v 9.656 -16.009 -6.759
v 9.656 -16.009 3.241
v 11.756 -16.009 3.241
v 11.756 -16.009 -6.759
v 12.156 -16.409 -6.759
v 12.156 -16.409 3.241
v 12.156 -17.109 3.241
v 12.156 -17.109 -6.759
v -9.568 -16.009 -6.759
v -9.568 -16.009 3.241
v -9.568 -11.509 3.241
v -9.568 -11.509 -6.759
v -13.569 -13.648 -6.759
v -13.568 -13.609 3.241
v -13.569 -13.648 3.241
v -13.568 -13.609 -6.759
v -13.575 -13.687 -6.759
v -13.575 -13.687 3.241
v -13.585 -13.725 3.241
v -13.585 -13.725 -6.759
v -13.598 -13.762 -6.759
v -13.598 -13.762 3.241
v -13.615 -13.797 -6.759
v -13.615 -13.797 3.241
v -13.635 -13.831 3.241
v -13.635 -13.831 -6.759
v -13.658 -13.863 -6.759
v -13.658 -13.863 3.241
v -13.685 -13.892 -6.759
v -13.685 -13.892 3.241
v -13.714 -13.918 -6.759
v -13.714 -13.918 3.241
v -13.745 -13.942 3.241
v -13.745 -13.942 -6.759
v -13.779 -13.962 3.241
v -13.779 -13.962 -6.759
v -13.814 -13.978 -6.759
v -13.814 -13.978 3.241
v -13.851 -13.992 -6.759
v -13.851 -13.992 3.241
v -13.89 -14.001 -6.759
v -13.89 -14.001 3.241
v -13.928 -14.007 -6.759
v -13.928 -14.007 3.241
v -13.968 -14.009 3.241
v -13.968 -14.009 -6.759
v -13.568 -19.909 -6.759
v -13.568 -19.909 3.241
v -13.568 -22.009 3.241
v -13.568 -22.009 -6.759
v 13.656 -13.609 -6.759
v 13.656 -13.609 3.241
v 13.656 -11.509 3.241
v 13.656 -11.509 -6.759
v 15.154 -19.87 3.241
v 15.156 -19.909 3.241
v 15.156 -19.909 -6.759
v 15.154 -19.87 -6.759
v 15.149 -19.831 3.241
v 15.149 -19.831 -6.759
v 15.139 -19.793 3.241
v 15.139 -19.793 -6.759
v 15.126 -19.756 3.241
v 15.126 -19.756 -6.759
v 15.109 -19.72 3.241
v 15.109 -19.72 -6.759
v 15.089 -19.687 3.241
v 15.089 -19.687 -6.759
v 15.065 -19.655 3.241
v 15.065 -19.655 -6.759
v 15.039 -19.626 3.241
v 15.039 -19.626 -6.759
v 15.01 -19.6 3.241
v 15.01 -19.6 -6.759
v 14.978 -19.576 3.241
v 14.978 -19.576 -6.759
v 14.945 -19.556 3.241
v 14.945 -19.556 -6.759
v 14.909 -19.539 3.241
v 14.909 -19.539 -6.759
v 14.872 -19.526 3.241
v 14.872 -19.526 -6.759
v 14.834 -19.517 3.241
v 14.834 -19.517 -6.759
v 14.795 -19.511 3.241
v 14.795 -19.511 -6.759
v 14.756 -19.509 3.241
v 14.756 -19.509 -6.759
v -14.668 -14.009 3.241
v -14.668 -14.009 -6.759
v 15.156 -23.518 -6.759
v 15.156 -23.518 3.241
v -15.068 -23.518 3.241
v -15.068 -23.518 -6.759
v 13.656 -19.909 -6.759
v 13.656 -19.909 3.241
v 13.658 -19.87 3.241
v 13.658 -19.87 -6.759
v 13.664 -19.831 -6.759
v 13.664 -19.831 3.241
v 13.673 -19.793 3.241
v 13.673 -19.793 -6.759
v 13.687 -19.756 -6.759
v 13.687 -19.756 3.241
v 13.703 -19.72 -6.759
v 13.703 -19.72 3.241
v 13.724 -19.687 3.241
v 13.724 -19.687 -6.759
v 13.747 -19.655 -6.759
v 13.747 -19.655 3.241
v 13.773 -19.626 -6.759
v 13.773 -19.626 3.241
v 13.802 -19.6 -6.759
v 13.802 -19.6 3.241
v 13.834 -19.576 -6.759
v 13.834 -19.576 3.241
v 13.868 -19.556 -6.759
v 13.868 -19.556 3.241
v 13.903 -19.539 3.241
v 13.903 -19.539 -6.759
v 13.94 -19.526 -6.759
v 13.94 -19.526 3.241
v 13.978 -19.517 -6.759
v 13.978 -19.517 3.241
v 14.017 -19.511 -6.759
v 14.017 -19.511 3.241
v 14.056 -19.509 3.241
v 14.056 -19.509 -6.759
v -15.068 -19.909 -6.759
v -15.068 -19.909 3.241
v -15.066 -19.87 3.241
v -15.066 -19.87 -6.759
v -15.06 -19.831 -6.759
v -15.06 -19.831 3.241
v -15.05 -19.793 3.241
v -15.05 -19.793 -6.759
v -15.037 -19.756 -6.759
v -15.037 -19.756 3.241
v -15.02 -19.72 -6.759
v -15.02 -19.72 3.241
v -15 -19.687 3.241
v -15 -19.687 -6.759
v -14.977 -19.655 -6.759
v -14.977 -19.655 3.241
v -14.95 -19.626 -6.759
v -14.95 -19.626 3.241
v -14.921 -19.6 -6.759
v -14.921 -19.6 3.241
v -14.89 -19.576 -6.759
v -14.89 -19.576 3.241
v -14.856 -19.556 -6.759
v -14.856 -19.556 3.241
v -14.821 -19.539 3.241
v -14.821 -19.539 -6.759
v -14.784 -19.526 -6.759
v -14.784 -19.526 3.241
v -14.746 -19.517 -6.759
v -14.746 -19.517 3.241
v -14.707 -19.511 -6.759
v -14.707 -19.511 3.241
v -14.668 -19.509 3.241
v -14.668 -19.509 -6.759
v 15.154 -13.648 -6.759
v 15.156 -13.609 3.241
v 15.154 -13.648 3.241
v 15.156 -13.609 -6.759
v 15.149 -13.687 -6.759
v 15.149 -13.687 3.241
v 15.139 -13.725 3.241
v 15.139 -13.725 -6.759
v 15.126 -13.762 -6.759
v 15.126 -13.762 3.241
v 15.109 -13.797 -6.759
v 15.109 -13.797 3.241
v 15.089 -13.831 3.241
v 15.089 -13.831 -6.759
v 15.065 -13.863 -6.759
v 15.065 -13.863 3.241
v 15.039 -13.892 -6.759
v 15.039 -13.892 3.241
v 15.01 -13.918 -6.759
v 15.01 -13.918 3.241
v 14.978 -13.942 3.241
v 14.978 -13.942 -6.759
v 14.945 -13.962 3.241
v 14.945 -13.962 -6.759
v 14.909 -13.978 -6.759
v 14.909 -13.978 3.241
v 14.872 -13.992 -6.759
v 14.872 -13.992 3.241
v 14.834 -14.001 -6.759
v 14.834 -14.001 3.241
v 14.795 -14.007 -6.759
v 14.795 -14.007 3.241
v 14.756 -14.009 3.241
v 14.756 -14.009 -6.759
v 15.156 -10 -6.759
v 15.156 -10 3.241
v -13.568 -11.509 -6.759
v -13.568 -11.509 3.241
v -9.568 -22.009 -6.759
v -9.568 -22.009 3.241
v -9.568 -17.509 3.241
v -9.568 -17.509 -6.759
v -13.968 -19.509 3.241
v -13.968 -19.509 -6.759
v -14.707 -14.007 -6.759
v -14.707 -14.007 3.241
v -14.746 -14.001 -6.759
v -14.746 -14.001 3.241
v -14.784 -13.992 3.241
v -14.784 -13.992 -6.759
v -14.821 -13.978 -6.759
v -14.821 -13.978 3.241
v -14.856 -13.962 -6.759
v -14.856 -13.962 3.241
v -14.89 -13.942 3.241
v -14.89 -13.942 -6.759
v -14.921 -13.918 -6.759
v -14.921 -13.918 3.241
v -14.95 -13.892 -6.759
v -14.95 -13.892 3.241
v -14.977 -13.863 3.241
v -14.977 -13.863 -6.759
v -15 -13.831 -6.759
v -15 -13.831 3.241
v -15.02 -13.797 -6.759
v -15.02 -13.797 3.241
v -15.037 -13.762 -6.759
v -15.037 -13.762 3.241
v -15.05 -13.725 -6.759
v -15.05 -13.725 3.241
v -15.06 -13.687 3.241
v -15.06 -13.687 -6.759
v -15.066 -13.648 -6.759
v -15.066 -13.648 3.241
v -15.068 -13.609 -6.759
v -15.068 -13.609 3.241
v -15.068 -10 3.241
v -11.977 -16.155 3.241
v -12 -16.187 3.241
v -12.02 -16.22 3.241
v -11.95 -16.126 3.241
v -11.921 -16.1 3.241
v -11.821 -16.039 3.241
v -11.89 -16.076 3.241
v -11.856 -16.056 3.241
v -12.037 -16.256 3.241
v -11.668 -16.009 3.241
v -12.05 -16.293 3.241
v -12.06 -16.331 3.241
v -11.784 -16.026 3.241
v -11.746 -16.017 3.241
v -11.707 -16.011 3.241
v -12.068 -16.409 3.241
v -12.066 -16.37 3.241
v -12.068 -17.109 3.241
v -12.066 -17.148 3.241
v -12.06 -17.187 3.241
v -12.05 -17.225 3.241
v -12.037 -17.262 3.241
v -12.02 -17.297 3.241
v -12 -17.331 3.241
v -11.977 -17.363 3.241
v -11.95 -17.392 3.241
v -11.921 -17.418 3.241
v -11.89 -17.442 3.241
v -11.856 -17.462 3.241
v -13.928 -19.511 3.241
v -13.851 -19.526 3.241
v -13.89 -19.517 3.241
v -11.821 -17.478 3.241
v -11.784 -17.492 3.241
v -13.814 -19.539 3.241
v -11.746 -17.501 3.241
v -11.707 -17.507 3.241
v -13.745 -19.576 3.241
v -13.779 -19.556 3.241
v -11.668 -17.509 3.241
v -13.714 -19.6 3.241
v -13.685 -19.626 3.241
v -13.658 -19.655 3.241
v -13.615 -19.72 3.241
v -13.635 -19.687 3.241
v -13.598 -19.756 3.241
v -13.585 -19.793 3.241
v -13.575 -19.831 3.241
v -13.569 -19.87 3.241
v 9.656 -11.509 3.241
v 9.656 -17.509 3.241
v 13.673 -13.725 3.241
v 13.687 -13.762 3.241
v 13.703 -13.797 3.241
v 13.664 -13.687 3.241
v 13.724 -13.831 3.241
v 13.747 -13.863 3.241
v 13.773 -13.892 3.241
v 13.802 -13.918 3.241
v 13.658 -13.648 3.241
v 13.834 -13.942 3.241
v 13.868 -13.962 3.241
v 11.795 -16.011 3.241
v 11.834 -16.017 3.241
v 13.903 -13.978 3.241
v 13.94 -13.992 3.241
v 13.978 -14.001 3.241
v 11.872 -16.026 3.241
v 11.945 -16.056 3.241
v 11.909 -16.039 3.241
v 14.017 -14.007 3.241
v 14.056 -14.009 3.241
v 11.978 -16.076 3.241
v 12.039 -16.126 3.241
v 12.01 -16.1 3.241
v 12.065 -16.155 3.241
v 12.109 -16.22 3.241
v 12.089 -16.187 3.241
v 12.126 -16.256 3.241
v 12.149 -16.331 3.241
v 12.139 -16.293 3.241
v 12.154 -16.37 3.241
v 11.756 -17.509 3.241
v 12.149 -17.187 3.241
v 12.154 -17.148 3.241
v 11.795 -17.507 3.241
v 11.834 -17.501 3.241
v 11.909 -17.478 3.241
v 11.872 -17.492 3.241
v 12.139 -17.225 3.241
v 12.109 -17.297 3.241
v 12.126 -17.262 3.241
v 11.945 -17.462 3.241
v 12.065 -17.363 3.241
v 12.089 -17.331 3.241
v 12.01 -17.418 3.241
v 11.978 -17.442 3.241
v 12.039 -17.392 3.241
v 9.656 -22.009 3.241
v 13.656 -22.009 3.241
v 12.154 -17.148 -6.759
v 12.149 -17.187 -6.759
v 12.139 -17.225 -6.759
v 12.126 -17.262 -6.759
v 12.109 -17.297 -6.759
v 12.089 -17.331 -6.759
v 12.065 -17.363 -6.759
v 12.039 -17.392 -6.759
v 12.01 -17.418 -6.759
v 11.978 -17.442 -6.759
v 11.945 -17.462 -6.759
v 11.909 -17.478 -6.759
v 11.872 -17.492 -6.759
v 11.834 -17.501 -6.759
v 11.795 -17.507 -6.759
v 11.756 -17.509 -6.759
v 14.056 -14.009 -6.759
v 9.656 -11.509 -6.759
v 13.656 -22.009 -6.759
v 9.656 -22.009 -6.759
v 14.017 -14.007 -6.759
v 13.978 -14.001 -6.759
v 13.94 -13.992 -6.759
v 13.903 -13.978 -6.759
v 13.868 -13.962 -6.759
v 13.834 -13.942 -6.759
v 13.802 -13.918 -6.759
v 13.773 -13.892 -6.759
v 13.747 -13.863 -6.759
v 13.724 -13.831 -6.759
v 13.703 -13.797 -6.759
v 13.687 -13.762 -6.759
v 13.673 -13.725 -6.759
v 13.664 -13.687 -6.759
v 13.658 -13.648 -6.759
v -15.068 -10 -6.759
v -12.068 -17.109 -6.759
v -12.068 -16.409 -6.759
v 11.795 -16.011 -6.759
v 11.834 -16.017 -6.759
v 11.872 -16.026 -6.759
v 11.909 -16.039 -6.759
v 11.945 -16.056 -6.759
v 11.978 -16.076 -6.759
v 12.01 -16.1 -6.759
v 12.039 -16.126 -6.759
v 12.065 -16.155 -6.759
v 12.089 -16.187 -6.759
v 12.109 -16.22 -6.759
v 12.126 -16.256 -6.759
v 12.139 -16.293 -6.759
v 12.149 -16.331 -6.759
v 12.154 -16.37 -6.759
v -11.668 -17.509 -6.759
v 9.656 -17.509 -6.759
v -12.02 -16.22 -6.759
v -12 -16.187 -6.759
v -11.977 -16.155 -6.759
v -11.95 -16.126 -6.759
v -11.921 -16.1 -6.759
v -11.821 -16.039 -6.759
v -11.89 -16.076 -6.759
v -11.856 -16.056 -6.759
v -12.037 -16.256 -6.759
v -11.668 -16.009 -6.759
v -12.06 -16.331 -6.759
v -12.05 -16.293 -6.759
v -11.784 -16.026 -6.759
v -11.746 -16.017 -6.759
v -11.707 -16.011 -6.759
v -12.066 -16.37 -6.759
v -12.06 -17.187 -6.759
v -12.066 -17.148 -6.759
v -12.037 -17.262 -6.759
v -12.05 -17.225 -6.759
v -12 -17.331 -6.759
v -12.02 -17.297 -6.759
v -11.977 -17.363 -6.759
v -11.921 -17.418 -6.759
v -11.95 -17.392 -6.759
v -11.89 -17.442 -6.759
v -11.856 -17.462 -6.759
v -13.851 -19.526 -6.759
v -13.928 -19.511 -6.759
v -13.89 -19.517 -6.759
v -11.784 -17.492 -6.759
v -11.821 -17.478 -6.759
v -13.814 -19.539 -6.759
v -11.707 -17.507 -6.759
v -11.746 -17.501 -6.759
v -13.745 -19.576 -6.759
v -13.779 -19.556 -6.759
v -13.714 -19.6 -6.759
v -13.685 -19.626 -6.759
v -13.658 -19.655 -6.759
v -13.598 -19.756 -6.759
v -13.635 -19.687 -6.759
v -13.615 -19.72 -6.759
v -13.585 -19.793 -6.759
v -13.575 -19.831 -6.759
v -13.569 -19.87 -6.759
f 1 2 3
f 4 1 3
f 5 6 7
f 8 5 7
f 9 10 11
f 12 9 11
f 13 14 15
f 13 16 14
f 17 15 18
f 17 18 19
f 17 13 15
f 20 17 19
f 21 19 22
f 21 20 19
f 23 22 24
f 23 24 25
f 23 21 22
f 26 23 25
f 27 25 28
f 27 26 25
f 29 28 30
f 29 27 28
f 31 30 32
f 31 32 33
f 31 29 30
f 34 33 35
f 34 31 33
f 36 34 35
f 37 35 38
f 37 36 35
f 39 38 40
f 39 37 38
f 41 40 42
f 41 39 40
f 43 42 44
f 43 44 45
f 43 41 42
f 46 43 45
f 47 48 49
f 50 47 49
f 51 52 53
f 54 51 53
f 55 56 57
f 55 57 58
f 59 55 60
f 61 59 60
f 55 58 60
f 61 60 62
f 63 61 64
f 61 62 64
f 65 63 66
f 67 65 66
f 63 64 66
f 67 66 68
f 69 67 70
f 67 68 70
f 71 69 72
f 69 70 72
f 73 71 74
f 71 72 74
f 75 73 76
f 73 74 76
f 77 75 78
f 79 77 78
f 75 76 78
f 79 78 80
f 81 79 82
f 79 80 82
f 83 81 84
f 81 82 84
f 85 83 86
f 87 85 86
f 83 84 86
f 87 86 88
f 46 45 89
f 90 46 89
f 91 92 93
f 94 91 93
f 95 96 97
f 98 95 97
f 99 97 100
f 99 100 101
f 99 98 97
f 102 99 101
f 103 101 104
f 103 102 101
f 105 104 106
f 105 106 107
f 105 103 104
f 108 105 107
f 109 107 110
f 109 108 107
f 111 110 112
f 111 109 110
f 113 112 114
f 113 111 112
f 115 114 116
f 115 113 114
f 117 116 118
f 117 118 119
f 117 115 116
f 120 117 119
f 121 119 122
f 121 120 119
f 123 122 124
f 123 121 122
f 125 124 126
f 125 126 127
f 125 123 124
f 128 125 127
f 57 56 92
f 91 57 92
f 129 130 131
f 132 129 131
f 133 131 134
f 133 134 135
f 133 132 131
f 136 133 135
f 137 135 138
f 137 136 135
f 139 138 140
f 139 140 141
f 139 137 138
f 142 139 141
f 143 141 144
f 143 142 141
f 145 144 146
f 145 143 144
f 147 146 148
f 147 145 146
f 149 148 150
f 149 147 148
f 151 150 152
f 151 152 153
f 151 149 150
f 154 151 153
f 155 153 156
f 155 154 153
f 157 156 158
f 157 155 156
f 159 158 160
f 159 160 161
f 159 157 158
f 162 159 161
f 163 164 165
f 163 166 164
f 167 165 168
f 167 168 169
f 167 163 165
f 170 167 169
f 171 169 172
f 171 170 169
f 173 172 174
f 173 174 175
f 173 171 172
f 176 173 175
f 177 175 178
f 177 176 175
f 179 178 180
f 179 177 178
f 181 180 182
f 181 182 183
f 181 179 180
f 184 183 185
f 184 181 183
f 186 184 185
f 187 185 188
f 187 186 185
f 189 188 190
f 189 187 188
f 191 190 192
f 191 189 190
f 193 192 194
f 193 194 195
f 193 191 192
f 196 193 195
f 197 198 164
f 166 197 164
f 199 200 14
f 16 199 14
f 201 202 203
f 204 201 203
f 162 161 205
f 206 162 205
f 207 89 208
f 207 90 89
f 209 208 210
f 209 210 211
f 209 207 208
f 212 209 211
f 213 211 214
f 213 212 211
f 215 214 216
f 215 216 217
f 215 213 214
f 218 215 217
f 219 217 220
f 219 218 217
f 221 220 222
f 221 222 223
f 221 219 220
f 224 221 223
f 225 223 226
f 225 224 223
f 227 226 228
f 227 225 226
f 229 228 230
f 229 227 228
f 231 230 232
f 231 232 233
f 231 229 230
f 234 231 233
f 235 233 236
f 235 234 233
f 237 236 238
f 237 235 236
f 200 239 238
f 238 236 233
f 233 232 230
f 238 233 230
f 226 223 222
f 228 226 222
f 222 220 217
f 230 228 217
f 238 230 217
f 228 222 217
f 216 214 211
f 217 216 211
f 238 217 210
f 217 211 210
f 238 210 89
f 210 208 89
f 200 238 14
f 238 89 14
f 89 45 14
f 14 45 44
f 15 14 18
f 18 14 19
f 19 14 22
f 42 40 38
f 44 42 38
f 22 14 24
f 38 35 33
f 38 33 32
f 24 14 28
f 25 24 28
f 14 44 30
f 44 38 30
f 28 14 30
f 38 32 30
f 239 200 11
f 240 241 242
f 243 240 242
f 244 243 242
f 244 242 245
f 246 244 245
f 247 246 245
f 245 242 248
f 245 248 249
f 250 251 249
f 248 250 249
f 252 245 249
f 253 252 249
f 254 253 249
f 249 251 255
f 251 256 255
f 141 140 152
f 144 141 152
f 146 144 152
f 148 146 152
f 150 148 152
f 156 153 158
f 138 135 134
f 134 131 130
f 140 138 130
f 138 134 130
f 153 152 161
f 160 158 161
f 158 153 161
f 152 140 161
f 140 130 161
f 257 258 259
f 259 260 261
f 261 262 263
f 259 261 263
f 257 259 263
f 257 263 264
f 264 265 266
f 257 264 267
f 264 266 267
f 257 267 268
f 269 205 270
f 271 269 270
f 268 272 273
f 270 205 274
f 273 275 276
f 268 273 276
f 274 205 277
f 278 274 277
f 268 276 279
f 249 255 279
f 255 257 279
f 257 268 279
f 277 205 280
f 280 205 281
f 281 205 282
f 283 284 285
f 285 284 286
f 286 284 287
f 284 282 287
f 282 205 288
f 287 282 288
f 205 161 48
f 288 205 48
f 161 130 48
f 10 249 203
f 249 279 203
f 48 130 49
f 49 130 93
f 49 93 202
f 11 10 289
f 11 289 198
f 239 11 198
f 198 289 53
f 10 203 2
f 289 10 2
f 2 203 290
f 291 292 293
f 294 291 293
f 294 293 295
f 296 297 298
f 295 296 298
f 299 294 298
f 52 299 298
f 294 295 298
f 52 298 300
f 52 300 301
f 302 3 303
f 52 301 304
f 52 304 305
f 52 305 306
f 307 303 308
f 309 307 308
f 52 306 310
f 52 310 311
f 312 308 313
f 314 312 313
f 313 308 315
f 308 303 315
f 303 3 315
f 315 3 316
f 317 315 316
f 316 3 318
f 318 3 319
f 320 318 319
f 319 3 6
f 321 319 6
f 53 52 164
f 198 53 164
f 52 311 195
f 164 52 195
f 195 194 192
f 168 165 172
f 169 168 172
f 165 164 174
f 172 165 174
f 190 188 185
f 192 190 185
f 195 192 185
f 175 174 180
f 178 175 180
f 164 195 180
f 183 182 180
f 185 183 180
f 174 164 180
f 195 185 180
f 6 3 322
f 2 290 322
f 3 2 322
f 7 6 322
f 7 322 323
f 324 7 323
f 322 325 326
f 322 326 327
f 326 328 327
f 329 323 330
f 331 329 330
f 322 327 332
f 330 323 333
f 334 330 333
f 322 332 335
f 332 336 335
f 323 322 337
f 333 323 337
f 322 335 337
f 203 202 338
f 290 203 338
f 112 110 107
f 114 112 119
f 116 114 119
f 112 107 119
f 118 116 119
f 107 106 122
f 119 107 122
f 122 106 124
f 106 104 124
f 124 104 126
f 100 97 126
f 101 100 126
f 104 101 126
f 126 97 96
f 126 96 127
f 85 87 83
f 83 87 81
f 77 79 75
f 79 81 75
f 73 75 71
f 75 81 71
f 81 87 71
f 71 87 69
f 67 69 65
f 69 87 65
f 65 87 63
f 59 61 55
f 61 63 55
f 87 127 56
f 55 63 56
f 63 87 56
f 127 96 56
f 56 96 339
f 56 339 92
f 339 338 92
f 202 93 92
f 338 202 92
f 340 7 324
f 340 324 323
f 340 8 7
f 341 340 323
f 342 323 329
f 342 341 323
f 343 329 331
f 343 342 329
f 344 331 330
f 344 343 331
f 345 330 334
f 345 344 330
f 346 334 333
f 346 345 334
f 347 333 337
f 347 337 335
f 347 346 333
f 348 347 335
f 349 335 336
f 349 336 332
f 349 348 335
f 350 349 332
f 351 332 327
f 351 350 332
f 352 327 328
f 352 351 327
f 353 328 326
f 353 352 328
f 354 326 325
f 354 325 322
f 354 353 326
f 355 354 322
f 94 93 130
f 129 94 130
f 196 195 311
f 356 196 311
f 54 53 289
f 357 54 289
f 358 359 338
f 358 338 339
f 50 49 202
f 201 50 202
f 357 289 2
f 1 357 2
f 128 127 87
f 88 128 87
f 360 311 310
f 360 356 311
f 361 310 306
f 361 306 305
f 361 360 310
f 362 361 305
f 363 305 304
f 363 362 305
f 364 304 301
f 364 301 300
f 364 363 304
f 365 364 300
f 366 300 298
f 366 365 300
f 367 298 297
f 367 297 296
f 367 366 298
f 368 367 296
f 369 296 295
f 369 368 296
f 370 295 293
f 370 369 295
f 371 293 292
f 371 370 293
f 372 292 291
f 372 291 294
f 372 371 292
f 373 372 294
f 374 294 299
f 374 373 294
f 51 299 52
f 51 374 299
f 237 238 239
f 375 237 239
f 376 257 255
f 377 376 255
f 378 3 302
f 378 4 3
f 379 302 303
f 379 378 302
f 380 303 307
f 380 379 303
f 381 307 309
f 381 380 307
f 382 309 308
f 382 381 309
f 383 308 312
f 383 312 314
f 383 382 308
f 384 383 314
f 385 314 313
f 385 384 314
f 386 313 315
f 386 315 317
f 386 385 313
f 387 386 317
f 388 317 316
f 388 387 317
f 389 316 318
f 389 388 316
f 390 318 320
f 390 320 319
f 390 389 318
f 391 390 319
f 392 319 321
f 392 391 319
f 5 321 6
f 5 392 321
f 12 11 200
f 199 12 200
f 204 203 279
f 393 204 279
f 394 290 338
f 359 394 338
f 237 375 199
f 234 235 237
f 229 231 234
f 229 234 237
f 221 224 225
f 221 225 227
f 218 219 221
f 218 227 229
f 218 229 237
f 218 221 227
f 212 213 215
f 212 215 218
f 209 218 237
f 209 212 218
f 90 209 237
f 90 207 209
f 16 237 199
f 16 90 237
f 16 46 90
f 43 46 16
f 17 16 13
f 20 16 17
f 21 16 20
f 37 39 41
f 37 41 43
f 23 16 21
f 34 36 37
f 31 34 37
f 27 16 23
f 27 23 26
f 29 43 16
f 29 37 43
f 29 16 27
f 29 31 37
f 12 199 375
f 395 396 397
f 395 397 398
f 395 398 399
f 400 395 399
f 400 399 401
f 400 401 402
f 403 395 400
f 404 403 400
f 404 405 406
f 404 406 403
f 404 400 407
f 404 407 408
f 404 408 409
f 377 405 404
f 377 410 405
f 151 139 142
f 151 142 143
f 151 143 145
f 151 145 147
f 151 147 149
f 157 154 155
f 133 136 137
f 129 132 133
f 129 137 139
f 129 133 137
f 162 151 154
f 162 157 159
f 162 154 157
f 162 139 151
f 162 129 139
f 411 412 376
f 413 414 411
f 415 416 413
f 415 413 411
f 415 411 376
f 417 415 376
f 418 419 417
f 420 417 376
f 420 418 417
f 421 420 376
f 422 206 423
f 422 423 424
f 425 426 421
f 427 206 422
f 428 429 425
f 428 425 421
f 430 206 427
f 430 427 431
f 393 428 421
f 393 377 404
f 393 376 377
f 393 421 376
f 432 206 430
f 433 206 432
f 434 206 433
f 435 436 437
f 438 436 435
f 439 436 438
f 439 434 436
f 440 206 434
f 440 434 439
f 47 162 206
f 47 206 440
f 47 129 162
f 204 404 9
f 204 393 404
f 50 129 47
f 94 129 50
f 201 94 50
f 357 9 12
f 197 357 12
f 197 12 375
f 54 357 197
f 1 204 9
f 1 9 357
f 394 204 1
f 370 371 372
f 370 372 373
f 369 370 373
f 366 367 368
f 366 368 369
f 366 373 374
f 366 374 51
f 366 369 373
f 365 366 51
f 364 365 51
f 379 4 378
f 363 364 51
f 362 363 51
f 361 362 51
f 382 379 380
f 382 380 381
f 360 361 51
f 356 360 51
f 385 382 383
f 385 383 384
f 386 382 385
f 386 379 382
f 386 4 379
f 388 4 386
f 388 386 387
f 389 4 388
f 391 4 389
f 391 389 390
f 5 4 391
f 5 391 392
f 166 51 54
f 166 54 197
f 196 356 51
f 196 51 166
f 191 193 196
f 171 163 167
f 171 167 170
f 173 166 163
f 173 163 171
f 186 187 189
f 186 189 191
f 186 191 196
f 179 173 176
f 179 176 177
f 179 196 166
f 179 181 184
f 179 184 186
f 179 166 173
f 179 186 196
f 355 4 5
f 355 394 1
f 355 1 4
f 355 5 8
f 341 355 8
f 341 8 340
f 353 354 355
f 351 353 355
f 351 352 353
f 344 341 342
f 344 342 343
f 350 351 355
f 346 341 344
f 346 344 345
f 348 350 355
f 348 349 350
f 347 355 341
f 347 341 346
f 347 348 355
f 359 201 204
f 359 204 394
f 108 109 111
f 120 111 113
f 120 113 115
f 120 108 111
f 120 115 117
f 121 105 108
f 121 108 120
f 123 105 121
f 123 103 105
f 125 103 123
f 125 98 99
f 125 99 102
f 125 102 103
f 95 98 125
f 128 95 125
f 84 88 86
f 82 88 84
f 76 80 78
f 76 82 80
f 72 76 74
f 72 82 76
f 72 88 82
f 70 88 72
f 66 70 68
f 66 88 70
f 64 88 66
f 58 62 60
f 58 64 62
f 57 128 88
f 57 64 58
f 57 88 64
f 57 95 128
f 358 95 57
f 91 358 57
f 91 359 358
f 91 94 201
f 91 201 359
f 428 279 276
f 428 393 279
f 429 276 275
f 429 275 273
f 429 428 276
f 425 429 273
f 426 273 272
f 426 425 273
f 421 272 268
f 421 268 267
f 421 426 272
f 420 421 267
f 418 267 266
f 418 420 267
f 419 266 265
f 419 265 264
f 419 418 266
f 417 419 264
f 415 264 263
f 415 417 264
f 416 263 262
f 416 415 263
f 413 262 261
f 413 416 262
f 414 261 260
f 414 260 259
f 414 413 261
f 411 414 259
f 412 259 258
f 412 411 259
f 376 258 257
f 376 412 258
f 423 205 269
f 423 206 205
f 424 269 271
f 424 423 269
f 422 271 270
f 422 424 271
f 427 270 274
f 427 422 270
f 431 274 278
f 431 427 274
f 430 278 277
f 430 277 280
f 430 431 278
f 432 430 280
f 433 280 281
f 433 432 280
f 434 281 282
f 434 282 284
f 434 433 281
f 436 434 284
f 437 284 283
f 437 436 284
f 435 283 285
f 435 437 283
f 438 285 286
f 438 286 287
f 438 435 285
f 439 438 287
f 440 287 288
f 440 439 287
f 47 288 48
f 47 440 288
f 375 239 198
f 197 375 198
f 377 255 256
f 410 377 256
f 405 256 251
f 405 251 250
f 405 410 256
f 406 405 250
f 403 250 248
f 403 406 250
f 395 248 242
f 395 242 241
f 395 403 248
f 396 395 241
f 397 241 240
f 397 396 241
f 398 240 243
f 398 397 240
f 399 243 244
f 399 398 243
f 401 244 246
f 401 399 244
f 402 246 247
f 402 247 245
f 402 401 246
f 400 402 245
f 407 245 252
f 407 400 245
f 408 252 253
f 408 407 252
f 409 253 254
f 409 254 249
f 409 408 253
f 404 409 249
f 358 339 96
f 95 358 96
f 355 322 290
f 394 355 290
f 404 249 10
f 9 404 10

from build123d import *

# Parameters (mm, degrees)
F1_DEPTH = 10
F2_R     = 0.4
F3_ANGLE = 90


with BuildPart() as f1:
    # F0 (on Front) → F1 (new body)
    with BuildSketch(Plane.XZ):
        Polygon((15.15625, 2.75), (15.15625, 6.758929), (0, 6.758929), (-15.067572, 6.758929), (-15.067572, 2.75), (-13.567572, 2.75), (-13.567572, 5.25), (-9.567572, 5.25), (-9.567572, 0.75), (-12.067572, 0.75), (-12.067572, 0), (-12.067572, -0.75), (-9.567572, -0.75), (-9.567572, -5.25), (-13.567572, -5.25), (-13.567572, -2.75), (-15.067572, -2.75), (-15.067572, -6.758929), (0, -6.758929), (15.15625, -6.758929), (15.15625, -2.75), (13.65625, -2.75), (13.65625, -5.25), (9.65625, -5.25), (9.65625, -0.75), (12.15625, -0.75), (12.15625, 0), (12.15625, 0.75), (9.65625, 0.75), (9.65625, 5.25), (13.65625, 5.25), (13.65625, 2.75), align=None)
    extrude(amount=F1_DEPTH)

    # F2
    f2_edges = [f1.edges().sort_by_distance(p)[0] for p in [
        (15.15625, -5, 2.75),
        (13.65625, -5, 2.75),
        (12.15625, -5, 0.75),
        (12.15625, -5, -0.75),
        (15.15625, -5, -2.75),
        (13.65625, -5, -2.75),
        (-13.567572, -5, -2.75),
        (-15.067572, -5, -2.75),
        (-12.067572, -5, 0.75),
        (-12.067572, -5, -0.75),
        (-13.567572, -5, 2.75),
        (-15.067572, -5, 2.75),
    ]]
    fillet(f2_edges, radius=F2_R)


with BuildPart() as f1_1:
    # F3: moved
    add(f1.part.rotate(Axis((0.044339, -10, -6.758929), (1, 0, 0)), F3_ANGLE))


solid = f1_1.part
